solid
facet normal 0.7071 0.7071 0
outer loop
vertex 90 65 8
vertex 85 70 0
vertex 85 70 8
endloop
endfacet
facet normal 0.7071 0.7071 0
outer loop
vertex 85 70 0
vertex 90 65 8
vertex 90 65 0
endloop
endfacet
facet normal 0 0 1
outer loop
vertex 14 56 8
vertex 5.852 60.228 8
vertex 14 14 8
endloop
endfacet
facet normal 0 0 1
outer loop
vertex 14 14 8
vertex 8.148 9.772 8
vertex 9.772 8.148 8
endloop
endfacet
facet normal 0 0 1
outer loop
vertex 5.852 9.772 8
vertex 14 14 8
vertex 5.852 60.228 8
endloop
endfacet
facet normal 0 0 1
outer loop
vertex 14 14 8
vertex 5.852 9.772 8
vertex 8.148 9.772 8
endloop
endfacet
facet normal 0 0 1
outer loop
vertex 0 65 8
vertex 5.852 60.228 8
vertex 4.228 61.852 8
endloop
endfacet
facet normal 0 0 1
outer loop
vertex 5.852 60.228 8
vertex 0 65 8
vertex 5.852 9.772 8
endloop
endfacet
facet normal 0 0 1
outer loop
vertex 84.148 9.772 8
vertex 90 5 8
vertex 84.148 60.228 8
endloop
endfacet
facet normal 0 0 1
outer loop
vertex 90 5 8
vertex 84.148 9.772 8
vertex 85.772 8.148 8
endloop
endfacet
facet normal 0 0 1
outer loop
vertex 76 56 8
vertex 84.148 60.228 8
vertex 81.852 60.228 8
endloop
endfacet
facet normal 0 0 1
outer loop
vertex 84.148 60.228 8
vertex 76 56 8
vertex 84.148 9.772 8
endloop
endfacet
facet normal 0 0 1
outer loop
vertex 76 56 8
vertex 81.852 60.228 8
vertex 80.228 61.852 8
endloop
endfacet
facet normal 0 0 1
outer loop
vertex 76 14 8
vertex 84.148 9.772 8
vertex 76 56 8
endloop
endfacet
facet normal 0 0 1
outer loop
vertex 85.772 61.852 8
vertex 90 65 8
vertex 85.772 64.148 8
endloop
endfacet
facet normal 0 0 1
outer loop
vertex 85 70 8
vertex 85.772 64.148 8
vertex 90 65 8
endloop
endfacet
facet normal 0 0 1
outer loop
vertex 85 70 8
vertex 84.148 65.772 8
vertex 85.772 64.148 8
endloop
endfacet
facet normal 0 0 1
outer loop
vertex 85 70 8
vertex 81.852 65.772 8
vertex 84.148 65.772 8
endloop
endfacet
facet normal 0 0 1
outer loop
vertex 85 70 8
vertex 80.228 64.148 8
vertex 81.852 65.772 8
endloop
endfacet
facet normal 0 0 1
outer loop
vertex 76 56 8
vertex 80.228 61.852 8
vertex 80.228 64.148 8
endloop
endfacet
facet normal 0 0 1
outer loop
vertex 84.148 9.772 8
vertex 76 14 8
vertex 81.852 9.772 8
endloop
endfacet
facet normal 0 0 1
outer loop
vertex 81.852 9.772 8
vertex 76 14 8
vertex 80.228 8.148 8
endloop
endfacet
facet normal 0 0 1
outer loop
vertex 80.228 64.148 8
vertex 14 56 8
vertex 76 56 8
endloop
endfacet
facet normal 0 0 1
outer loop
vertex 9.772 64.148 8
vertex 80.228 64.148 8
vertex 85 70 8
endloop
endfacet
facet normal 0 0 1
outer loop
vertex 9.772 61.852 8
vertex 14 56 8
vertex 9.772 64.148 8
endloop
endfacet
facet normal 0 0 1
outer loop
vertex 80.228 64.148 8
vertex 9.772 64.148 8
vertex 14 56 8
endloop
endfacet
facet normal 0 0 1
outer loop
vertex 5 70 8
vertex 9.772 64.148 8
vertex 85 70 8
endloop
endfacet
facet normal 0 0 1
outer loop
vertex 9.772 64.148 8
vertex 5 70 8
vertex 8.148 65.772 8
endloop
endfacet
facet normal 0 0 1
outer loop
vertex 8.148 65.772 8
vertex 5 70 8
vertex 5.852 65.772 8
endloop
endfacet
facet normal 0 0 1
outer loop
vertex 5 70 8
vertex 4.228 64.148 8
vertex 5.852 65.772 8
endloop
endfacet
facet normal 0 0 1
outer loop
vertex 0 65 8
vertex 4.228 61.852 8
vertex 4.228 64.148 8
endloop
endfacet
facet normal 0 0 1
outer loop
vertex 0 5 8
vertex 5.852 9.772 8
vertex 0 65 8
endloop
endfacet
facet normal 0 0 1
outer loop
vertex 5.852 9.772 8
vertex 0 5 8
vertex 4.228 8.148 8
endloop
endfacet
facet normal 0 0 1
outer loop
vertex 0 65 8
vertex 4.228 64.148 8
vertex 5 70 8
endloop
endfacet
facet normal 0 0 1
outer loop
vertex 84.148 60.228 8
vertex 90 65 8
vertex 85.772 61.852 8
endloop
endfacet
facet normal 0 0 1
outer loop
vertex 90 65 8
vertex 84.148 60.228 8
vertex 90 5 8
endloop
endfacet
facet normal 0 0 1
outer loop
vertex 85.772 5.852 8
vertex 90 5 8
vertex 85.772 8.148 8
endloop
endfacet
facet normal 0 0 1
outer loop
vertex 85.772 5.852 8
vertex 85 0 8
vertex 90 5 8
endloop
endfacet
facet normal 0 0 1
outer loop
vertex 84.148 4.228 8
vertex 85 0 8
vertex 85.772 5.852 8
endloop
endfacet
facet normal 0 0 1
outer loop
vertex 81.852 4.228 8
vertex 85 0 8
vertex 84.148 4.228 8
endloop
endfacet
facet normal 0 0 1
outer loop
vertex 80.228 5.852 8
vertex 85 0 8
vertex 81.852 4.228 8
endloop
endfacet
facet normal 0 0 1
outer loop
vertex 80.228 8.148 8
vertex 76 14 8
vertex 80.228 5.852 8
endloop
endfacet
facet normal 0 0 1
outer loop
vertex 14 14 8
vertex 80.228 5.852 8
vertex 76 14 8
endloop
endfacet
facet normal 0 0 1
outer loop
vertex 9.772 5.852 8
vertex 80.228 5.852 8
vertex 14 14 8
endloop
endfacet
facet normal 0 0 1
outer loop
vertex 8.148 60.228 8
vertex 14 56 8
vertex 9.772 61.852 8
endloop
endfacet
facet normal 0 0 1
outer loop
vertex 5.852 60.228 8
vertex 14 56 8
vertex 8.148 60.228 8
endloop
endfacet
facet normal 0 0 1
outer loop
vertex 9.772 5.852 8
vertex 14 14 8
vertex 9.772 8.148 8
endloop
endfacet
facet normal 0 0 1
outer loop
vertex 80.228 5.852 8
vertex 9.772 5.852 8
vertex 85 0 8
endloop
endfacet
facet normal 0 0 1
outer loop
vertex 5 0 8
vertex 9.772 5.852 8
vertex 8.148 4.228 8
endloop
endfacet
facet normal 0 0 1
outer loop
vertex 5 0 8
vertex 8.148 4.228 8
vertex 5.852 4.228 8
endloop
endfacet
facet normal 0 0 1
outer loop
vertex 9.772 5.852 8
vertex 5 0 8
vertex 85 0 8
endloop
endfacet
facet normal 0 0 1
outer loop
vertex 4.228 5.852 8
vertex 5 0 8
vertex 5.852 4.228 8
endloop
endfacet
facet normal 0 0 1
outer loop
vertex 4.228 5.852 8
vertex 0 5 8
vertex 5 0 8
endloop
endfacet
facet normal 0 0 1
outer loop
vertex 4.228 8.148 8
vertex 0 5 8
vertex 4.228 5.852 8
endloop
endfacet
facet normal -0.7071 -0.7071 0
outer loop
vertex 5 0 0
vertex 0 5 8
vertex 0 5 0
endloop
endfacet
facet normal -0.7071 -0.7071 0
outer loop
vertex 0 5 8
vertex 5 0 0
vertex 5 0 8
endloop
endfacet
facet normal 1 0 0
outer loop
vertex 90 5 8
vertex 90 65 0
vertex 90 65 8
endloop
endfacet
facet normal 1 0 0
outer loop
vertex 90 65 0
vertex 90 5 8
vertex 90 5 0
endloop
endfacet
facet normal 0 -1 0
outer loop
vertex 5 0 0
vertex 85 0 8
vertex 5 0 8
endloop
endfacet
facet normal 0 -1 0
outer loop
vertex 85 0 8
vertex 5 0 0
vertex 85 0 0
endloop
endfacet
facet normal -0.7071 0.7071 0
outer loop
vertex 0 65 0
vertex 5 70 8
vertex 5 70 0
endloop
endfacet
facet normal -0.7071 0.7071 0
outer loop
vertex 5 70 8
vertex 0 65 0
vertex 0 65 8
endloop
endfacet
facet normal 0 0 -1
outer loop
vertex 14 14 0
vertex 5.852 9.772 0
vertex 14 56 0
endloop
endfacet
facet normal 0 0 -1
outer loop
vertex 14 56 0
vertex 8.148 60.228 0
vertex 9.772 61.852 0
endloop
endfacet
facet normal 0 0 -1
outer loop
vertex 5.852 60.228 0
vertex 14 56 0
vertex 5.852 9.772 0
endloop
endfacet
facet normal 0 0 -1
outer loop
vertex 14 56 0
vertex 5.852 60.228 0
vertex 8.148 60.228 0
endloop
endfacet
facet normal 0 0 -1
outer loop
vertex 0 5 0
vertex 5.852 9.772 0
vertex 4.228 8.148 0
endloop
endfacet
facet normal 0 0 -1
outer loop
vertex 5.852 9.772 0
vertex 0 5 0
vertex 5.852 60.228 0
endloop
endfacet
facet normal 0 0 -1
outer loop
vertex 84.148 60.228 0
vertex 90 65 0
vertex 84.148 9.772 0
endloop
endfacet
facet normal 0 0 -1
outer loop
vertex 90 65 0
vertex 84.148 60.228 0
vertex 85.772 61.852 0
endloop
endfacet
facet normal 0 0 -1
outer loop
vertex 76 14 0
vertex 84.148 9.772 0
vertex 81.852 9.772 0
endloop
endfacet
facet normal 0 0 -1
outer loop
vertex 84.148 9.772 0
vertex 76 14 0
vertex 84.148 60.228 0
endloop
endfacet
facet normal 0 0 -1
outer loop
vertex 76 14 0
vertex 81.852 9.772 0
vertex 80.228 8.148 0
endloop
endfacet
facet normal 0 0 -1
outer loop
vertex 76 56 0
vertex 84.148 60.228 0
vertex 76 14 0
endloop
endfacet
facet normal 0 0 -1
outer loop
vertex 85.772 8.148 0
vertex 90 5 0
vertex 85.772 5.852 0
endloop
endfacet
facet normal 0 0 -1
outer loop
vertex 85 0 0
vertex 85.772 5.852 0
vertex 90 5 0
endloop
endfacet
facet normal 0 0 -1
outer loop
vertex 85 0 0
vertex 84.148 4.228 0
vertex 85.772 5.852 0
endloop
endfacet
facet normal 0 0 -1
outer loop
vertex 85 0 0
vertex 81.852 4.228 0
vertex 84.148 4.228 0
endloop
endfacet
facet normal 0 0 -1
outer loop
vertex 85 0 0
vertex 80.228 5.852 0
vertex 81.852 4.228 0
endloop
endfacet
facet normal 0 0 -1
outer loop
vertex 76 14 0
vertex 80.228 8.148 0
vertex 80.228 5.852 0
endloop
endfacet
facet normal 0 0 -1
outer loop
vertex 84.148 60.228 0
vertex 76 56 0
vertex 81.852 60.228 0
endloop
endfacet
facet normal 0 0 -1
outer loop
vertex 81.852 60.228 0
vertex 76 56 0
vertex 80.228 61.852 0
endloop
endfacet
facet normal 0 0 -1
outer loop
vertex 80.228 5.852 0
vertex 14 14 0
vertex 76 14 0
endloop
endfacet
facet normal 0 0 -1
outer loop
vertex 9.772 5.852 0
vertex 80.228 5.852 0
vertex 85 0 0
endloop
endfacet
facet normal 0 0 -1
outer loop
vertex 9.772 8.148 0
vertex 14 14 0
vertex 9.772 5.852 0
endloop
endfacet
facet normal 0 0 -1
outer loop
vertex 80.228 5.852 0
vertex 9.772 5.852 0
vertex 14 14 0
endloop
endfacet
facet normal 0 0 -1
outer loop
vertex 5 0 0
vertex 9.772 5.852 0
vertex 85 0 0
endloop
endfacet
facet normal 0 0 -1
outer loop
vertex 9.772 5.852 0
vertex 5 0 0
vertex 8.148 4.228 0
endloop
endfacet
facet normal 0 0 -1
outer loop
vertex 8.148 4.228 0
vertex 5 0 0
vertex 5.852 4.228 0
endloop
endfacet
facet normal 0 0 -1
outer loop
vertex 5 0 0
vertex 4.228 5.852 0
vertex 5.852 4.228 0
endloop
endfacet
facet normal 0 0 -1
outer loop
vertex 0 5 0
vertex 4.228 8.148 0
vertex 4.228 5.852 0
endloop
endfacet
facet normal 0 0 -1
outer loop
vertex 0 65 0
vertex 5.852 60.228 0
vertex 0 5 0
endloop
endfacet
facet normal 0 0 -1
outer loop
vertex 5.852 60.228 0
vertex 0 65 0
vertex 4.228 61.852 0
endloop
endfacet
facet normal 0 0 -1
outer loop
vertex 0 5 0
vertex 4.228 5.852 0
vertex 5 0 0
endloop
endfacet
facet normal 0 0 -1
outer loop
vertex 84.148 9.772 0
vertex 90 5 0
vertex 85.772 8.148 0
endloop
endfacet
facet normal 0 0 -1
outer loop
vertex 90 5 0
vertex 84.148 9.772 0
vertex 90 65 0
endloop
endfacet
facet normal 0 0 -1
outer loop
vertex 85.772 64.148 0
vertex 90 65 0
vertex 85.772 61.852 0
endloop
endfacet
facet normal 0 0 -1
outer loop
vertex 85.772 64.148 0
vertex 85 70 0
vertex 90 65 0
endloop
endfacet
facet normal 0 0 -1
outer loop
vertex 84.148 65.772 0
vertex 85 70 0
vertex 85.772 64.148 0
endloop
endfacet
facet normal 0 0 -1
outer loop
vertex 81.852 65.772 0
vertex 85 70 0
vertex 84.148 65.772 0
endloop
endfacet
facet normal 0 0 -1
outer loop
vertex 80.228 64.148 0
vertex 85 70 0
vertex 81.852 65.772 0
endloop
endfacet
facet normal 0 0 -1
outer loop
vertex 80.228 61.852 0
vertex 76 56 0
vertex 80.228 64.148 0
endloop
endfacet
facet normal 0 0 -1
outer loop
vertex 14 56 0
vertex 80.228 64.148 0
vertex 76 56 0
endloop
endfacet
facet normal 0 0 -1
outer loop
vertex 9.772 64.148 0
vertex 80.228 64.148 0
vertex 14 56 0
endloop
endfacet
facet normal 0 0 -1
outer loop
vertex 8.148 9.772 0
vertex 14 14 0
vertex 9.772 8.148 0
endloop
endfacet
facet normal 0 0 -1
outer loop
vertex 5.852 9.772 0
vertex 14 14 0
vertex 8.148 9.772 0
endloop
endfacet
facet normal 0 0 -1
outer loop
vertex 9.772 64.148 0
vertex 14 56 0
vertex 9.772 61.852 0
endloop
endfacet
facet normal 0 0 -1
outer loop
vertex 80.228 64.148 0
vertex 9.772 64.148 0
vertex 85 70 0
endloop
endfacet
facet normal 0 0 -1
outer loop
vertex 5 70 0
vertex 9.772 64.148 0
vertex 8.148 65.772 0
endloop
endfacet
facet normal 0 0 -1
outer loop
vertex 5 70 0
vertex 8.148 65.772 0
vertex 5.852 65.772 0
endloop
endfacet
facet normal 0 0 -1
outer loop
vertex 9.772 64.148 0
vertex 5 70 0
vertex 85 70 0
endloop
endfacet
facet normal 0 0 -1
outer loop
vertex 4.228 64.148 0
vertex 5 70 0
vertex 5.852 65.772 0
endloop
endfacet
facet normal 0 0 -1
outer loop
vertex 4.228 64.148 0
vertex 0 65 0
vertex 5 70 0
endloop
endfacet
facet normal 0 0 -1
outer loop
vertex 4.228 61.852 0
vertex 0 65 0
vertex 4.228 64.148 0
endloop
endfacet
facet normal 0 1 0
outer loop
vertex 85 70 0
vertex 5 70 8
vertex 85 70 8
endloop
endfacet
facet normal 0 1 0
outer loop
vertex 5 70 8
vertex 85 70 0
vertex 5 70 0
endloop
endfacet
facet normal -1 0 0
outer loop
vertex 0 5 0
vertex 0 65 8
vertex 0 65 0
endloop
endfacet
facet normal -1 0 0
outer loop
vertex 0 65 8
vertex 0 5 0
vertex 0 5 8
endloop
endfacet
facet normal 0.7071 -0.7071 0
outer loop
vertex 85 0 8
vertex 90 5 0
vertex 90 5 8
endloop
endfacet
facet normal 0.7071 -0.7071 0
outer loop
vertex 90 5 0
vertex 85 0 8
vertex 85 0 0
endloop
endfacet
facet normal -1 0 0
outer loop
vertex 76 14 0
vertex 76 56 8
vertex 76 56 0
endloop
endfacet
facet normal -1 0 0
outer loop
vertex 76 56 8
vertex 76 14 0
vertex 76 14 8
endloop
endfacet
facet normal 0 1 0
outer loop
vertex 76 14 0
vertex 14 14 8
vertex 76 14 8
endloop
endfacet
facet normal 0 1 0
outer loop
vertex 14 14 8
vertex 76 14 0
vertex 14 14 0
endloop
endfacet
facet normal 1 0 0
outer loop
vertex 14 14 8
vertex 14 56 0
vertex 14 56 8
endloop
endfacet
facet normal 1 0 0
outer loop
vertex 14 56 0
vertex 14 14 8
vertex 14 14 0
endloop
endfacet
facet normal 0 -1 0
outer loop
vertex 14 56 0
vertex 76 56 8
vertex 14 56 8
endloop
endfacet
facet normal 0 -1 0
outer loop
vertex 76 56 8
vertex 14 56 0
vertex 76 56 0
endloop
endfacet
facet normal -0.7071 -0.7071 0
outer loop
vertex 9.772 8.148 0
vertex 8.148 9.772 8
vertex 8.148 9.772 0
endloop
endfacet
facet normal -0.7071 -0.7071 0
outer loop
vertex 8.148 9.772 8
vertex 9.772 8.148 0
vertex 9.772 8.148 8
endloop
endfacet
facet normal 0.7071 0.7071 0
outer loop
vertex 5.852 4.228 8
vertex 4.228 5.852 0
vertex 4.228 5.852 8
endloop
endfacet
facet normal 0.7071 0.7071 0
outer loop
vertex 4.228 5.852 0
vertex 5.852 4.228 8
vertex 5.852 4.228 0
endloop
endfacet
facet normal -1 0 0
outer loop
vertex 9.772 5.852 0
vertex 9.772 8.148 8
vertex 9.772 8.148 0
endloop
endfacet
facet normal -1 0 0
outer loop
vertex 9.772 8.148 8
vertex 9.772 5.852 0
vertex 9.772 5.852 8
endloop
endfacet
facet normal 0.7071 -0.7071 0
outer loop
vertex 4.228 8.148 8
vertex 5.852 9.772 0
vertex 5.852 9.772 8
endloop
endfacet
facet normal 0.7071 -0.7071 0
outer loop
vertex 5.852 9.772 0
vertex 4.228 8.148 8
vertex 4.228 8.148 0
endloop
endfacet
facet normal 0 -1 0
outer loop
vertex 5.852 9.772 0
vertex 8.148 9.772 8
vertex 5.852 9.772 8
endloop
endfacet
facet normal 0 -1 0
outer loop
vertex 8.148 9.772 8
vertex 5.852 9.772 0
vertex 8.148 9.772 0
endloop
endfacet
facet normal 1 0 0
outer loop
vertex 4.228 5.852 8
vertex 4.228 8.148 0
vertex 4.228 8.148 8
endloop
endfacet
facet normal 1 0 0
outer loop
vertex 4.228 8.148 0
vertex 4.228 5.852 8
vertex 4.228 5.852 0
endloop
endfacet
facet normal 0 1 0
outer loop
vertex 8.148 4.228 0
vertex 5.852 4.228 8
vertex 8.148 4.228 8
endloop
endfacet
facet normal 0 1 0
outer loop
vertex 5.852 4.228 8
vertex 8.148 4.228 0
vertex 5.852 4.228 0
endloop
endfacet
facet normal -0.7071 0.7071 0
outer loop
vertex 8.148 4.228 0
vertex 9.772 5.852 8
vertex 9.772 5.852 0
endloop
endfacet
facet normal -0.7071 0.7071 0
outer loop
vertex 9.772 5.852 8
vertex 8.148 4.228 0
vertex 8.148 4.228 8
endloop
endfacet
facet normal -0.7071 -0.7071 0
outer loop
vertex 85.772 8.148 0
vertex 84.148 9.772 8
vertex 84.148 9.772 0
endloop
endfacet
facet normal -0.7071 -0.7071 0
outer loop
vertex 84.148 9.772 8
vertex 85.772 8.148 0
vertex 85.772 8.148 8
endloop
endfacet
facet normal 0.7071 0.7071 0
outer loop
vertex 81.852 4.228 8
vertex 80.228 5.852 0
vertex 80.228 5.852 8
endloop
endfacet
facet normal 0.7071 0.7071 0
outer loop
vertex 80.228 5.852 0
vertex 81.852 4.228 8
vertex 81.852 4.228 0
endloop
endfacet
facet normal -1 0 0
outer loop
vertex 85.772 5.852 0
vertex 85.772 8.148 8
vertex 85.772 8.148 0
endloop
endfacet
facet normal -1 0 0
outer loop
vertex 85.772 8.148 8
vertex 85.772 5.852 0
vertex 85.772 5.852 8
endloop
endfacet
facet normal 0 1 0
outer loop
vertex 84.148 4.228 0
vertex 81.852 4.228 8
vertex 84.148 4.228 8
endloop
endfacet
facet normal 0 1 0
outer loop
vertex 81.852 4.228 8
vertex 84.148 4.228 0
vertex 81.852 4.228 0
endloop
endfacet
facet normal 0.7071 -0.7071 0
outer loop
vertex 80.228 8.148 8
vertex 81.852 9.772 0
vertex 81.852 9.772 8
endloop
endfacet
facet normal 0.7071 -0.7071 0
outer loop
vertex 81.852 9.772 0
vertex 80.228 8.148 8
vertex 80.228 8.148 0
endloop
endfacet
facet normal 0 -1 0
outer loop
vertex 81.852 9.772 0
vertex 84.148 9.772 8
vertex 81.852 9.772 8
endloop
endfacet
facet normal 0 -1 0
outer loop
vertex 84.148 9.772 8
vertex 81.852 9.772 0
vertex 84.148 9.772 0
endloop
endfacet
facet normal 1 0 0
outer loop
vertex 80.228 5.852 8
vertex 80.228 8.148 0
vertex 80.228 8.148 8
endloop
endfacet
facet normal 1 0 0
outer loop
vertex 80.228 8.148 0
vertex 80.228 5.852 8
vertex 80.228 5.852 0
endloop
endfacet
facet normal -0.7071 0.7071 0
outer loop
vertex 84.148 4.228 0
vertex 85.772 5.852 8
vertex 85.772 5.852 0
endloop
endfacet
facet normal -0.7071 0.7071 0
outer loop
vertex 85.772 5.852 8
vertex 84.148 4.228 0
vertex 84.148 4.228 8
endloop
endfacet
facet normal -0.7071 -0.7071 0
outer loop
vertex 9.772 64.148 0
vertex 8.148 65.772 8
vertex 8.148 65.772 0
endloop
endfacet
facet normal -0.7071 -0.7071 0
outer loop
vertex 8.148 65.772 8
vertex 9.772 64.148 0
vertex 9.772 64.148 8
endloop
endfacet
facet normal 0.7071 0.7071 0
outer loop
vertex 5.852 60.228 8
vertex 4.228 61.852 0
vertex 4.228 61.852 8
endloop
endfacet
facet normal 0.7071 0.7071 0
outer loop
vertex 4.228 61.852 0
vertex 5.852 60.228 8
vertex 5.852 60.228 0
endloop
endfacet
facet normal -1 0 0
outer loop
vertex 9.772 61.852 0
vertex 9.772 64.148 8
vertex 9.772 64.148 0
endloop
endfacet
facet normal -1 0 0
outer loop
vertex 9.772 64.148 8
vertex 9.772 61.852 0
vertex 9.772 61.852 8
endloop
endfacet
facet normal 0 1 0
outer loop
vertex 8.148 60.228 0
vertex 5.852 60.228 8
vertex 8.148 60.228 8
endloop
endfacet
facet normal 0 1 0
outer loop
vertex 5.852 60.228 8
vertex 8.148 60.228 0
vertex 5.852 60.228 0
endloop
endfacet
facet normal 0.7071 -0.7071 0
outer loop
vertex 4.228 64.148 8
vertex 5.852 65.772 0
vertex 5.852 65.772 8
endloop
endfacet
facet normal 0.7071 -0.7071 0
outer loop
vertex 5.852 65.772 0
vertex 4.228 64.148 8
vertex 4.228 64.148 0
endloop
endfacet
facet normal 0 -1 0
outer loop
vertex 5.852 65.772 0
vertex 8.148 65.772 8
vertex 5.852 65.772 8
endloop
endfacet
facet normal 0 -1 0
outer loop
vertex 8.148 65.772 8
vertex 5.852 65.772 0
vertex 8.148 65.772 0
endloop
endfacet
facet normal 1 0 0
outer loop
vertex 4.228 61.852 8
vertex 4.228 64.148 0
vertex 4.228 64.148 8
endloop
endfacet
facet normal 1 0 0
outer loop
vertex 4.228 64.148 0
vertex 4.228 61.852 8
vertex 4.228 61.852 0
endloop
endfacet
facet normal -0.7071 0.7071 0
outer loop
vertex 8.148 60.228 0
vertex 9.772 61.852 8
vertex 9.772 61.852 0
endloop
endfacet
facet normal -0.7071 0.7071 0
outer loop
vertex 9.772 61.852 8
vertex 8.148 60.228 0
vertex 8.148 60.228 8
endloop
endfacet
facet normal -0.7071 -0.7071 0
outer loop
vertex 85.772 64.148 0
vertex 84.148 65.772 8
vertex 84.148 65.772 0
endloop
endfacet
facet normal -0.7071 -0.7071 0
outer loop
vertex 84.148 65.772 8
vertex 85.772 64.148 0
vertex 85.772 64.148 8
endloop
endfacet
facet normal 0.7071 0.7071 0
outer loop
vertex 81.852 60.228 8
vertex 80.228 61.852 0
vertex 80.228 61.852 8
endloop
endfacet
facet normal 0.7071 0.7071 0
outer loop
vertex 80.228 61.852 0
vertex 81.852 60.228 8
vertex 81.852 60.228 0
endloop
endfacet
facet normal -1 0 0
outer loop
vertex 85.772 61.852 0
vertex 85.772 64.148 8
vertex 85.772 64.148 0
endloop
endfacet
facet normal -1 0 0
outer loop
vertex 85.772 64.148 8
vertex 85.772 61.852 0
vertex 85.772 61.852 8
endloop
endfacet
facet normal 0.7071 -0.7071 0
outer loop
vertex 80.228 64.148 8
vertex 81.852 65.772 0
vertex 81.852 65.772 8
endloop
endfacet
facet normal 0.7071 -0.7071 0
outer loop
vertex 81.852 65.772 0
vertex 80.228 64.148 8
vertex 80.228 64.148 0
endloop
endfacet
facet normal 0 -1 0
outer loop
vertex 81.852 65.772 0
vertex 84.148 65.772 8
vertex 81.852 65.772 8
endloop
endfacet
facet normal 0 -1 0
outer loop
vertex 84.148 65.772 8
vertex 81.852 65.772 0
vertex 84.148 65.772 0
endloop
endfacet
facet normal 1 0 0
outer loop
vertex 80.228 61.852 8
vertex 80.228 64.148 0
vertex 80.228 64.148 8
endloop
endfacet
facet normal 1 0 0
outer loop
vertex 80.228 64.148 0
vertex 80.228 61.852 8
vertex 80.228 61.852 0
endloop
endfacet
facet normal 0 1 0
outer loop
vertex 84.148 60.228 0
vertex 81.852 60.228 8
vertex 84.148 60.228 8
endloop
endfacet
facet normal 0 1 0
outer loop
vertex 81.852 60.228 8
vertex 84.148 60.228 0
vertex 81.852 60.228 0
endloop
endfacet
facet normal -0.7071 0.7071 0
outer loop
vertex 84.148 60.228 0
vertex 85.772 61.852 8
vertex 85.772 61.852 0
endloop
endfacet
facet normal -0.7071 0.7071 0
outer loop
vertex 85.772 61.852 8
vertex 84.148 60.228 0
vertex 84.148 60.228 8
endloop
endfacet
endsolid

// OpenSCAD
$fn = 32;

// ----------------------------------------------------------------------
// Frame plate: 90 x 70 frame, 14 mm rails
// ----------------------------------------------------------------------

// --- parameters (mm) ---
plate_l = 90;             // plate length, X
plate_w = 70;             // plate width, Y
plate_t = 8;              // plate thickness, Z (extrusion height)
corner_c = 5;             // corner chamfer
frame_bar = 14;           // frame rail width
bolt_r = 3;               // corner bolt window radius
bolt_inset = 7;           // bolt centre inset from the edges

win_l = plate_l - 2 * frame_bar;  // window length
win_w = plate_w - 2 * frame_bar;  // window width
bolt_d = 2 * bolt_r;  // corner hole diameter

profile = [[5, 0], [85, 0], [90, 5], [90, 65], [85, 70], [5, 70], [0, 65], [0, 5]];  // primary outline, 8 points, counter clockwise
void_1 = [[14, 14], [76, 14], [76, 56], [14, 56]];  // the window, 4 points
void_2 = [[9.772, 8.148], [8.148, 9.772], [5.852, 9.772], [4.228, 8.148], [4.228, 5.852], [5.852, 4.228], [8.148, 4.228], [9.772, 5.852]];  // corner bolt window, 8 points
void_3 = [[85.772, 8.148], [84.148, 9.772], [81.852, 9.772], [80.228, 8.148], [80.228, 5.852], [81.852, 4.228], [84.148, 4.228], [85.772, 5.852]];  // corner bolt window, 8 points
void_4 = [[9.772, 64.148], [8.148, 65.772], [5.852, 65.772], [4.228, 64.148], [4.228, 61.852], [5.852, 60.228], [8.148, 60.228], [9.772, 61.852]];  // corner bolt window, 8 points
void_5 = [[85.772, 64.148], [84.148, 65.772], [81.852, 65.772], [80.228, 64.148], [80.228, 61.852], [81.852, 60.228], [84.148, 60.228], [85.772, 61.852]];  // corner bolt window, 8 points

// --- the one profile operation ---
difference() {
  linear_extrude(height = plate_t) polygon(points = profile);
  translate([0, 0, -1])
    linear_extrude(height = plate_t + 2) polygon(points = void_1);
  translate([0, 0, -1])
    linear_extrude(height = plate_t + 2) polygon(points = void_2);
  translate([0, 0, -1])
    linear_extrude(height = plate_t + 2) polygon(points = void_3);
  translate([0, 0, -1])
    linear_extrude(height = plate_t + 2) polygon(points = void_4);
  translate([0, 0, -1])
    linear_extrude(height = plate_t + 2) polygon(points = void_5);
}
